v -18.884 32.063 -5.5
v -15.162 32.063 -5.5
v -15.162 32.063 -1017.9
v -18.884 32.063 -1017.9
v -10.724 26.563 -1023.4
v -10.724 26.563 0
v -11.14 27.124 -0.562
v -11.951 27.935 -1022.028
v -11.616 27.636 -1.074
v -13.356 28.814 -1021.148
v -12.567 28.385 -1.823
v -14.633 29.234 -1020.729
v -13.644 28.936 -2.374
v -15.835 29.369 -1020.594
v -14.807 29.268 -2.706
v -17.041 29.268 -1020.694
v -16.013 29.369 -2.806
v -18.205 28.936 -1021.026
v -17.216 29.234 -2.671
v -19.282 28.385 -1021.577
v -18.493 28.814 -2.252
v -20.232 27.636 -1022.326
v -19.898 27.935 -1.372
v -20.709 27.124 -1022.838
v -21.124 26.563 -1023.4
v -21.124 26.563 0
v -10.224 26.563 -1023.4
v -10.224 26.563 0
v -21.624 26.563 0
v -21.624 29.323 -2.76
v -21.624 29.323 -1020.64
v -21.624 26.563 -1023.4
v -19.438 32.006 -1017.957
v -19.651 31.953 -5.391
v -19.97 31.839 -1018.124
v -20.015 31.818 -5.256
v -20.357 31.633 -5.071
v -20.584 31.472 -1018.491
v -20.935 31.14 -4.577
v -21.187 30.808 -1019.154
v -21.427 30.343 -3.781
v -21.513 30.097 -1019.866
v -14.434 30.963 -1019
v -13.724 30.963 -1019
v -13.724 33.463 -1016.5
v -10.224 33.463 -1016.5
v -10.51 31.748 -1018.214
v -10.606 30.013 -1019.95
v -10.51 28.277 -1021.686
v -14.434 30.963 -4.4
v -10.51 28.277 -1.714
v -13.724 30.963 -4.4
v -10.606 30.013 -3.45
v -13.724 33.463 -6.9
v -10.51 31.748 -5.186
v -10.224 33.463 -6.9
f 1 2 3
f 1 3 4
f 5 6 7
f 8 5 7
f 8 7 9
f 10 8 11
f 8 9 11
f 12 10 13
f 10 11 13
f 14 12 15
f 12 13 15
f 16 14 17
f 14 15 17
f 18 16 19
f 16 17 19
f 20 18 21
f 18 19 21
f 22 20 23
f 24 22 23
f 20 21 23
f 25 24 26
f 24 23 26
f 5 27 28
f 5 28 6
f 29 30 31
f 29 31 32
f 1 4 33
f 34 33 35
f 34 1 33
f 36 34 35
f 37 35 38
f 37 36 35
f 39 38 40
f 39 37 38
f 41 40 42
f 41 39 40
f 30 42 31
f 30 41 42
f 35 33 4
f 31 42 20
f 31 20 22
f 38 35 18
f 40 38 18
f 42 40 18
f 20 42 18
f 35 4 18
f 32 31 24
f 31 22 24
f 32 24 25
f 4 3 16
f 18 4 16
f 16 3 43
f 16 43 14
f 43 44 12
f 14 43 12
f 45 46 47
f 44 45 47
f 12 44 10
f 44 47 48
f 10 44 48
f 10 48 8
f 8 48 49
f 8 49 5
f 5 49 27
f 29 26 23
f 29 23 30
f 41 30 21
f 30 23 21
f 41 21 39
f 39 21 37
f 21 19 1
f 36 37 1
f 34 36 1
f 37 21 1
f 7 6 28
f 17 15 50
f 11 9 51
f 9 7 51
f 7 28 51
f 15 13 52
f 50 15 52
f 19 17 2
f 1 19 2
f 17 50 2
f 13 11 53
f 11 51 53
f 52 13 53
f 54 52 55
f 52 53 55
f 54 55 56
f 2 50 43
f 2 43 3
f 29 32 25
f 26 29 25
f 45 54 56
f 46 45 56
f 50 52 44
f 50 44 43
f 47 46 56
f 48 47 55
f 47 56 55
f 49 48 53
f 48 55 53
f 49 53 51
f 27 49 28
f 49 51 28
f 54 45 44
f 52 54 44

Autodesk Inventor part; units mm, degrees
ref_plane "YZ Plane" through (0, 0, 0) normal (1, 0, 0) x (0, 1, 0)
ref_plane "XZ Plane" through (0, 0, 0) normal (0, 1, 0) x (-1, 0, 0)
sketch "Boceto3" plane through (0, 0, 0) normal (0, 0, 1) x (1, 0, 0)
  line L0 (-15.1624, 32.0626) -> (-18.8843, 32.0626)
  line L1 (-13.7243, 33.4626) -> (-13.7243, 30.9626)
  line L2 (-13.7243, 30.9626) -> (-14.4343, 30.9626)
  line L3 (-14.4343, 30.9626) -> (-15.1624, 32.0626)
  arc A0 (-18.8843, 32.0626) -> (-21.6243, 29.3226) centre (-18.8843, 29.3226) ccw
  line L4 (-13.7243, 33.4626) -> (-10.2243, 33.4626)
  line L5 (-21.6243, 29.3226) -> (-21.6243, 26.5626)
  arc A1 (-10.2243, 33.4626) -> (-10.2243, 26.5626) centre (5.1794, 30.0126) ccw
  line L6 (-21.6243, 26.5626) -> (-21.1243, 26.5626)
  line L7 (-10.2243, 26.5626) -> (-10.7243, 26.5626)
  arc A2 (-10.7243, 26.5626) -> (-21.1243, 26.5626) centre (-15.9243, 23.1493) ccw
  dimension "d218" = 2.5
  dimension "d219" = 0.71
  dimension "d221" = 33.5
  dimension "d223" = 2.74
  dimension "d281" = 3.5
  dimension "d288" = 2.76
  dimension "d291" = 0.5
  dimension "d292" = 0.5
extrude "Extrusión4" add sketch "Boceto3" against normal blind 1023.4
ref_plane "Plano de trabajo2" through (-10.2243, 33.4626, 0) normal (-1, 0, 0) x (0, 0, -1)
ref_plane "Plano de trabajo4" through (0, 0, -511.7) normal (0, 0, 1) x (1, 0, 0)
sketch "Boceto5" plane through (-10.2243, 33.4626, 0) normal (-1, 0, 0) x (0, 0, -1)
  line L0 (0, 0) -> (0, 6.9) projected
  line L1 (0, 6.9) -> (6.9, 0)
  line L2 (0, 0) -> (1023.4, 0) projected
  line L3 (6.9, 0) -> (0, 0)
  line L4 (0, 0) -> (0, 6.9)
  point P0 (0, 33.4626)
  dimension "d296" = 45
extrude "Extrusión6" cut sketch "Boceto5" along normal through all
mirror "Simetría3" about plane through (0, 0, -511.7) normal (0, 0, 1) of "Extrusión6"
properties part number "SP40-10 JUNTA INT CRISTAL 1023" material "Caucho"
